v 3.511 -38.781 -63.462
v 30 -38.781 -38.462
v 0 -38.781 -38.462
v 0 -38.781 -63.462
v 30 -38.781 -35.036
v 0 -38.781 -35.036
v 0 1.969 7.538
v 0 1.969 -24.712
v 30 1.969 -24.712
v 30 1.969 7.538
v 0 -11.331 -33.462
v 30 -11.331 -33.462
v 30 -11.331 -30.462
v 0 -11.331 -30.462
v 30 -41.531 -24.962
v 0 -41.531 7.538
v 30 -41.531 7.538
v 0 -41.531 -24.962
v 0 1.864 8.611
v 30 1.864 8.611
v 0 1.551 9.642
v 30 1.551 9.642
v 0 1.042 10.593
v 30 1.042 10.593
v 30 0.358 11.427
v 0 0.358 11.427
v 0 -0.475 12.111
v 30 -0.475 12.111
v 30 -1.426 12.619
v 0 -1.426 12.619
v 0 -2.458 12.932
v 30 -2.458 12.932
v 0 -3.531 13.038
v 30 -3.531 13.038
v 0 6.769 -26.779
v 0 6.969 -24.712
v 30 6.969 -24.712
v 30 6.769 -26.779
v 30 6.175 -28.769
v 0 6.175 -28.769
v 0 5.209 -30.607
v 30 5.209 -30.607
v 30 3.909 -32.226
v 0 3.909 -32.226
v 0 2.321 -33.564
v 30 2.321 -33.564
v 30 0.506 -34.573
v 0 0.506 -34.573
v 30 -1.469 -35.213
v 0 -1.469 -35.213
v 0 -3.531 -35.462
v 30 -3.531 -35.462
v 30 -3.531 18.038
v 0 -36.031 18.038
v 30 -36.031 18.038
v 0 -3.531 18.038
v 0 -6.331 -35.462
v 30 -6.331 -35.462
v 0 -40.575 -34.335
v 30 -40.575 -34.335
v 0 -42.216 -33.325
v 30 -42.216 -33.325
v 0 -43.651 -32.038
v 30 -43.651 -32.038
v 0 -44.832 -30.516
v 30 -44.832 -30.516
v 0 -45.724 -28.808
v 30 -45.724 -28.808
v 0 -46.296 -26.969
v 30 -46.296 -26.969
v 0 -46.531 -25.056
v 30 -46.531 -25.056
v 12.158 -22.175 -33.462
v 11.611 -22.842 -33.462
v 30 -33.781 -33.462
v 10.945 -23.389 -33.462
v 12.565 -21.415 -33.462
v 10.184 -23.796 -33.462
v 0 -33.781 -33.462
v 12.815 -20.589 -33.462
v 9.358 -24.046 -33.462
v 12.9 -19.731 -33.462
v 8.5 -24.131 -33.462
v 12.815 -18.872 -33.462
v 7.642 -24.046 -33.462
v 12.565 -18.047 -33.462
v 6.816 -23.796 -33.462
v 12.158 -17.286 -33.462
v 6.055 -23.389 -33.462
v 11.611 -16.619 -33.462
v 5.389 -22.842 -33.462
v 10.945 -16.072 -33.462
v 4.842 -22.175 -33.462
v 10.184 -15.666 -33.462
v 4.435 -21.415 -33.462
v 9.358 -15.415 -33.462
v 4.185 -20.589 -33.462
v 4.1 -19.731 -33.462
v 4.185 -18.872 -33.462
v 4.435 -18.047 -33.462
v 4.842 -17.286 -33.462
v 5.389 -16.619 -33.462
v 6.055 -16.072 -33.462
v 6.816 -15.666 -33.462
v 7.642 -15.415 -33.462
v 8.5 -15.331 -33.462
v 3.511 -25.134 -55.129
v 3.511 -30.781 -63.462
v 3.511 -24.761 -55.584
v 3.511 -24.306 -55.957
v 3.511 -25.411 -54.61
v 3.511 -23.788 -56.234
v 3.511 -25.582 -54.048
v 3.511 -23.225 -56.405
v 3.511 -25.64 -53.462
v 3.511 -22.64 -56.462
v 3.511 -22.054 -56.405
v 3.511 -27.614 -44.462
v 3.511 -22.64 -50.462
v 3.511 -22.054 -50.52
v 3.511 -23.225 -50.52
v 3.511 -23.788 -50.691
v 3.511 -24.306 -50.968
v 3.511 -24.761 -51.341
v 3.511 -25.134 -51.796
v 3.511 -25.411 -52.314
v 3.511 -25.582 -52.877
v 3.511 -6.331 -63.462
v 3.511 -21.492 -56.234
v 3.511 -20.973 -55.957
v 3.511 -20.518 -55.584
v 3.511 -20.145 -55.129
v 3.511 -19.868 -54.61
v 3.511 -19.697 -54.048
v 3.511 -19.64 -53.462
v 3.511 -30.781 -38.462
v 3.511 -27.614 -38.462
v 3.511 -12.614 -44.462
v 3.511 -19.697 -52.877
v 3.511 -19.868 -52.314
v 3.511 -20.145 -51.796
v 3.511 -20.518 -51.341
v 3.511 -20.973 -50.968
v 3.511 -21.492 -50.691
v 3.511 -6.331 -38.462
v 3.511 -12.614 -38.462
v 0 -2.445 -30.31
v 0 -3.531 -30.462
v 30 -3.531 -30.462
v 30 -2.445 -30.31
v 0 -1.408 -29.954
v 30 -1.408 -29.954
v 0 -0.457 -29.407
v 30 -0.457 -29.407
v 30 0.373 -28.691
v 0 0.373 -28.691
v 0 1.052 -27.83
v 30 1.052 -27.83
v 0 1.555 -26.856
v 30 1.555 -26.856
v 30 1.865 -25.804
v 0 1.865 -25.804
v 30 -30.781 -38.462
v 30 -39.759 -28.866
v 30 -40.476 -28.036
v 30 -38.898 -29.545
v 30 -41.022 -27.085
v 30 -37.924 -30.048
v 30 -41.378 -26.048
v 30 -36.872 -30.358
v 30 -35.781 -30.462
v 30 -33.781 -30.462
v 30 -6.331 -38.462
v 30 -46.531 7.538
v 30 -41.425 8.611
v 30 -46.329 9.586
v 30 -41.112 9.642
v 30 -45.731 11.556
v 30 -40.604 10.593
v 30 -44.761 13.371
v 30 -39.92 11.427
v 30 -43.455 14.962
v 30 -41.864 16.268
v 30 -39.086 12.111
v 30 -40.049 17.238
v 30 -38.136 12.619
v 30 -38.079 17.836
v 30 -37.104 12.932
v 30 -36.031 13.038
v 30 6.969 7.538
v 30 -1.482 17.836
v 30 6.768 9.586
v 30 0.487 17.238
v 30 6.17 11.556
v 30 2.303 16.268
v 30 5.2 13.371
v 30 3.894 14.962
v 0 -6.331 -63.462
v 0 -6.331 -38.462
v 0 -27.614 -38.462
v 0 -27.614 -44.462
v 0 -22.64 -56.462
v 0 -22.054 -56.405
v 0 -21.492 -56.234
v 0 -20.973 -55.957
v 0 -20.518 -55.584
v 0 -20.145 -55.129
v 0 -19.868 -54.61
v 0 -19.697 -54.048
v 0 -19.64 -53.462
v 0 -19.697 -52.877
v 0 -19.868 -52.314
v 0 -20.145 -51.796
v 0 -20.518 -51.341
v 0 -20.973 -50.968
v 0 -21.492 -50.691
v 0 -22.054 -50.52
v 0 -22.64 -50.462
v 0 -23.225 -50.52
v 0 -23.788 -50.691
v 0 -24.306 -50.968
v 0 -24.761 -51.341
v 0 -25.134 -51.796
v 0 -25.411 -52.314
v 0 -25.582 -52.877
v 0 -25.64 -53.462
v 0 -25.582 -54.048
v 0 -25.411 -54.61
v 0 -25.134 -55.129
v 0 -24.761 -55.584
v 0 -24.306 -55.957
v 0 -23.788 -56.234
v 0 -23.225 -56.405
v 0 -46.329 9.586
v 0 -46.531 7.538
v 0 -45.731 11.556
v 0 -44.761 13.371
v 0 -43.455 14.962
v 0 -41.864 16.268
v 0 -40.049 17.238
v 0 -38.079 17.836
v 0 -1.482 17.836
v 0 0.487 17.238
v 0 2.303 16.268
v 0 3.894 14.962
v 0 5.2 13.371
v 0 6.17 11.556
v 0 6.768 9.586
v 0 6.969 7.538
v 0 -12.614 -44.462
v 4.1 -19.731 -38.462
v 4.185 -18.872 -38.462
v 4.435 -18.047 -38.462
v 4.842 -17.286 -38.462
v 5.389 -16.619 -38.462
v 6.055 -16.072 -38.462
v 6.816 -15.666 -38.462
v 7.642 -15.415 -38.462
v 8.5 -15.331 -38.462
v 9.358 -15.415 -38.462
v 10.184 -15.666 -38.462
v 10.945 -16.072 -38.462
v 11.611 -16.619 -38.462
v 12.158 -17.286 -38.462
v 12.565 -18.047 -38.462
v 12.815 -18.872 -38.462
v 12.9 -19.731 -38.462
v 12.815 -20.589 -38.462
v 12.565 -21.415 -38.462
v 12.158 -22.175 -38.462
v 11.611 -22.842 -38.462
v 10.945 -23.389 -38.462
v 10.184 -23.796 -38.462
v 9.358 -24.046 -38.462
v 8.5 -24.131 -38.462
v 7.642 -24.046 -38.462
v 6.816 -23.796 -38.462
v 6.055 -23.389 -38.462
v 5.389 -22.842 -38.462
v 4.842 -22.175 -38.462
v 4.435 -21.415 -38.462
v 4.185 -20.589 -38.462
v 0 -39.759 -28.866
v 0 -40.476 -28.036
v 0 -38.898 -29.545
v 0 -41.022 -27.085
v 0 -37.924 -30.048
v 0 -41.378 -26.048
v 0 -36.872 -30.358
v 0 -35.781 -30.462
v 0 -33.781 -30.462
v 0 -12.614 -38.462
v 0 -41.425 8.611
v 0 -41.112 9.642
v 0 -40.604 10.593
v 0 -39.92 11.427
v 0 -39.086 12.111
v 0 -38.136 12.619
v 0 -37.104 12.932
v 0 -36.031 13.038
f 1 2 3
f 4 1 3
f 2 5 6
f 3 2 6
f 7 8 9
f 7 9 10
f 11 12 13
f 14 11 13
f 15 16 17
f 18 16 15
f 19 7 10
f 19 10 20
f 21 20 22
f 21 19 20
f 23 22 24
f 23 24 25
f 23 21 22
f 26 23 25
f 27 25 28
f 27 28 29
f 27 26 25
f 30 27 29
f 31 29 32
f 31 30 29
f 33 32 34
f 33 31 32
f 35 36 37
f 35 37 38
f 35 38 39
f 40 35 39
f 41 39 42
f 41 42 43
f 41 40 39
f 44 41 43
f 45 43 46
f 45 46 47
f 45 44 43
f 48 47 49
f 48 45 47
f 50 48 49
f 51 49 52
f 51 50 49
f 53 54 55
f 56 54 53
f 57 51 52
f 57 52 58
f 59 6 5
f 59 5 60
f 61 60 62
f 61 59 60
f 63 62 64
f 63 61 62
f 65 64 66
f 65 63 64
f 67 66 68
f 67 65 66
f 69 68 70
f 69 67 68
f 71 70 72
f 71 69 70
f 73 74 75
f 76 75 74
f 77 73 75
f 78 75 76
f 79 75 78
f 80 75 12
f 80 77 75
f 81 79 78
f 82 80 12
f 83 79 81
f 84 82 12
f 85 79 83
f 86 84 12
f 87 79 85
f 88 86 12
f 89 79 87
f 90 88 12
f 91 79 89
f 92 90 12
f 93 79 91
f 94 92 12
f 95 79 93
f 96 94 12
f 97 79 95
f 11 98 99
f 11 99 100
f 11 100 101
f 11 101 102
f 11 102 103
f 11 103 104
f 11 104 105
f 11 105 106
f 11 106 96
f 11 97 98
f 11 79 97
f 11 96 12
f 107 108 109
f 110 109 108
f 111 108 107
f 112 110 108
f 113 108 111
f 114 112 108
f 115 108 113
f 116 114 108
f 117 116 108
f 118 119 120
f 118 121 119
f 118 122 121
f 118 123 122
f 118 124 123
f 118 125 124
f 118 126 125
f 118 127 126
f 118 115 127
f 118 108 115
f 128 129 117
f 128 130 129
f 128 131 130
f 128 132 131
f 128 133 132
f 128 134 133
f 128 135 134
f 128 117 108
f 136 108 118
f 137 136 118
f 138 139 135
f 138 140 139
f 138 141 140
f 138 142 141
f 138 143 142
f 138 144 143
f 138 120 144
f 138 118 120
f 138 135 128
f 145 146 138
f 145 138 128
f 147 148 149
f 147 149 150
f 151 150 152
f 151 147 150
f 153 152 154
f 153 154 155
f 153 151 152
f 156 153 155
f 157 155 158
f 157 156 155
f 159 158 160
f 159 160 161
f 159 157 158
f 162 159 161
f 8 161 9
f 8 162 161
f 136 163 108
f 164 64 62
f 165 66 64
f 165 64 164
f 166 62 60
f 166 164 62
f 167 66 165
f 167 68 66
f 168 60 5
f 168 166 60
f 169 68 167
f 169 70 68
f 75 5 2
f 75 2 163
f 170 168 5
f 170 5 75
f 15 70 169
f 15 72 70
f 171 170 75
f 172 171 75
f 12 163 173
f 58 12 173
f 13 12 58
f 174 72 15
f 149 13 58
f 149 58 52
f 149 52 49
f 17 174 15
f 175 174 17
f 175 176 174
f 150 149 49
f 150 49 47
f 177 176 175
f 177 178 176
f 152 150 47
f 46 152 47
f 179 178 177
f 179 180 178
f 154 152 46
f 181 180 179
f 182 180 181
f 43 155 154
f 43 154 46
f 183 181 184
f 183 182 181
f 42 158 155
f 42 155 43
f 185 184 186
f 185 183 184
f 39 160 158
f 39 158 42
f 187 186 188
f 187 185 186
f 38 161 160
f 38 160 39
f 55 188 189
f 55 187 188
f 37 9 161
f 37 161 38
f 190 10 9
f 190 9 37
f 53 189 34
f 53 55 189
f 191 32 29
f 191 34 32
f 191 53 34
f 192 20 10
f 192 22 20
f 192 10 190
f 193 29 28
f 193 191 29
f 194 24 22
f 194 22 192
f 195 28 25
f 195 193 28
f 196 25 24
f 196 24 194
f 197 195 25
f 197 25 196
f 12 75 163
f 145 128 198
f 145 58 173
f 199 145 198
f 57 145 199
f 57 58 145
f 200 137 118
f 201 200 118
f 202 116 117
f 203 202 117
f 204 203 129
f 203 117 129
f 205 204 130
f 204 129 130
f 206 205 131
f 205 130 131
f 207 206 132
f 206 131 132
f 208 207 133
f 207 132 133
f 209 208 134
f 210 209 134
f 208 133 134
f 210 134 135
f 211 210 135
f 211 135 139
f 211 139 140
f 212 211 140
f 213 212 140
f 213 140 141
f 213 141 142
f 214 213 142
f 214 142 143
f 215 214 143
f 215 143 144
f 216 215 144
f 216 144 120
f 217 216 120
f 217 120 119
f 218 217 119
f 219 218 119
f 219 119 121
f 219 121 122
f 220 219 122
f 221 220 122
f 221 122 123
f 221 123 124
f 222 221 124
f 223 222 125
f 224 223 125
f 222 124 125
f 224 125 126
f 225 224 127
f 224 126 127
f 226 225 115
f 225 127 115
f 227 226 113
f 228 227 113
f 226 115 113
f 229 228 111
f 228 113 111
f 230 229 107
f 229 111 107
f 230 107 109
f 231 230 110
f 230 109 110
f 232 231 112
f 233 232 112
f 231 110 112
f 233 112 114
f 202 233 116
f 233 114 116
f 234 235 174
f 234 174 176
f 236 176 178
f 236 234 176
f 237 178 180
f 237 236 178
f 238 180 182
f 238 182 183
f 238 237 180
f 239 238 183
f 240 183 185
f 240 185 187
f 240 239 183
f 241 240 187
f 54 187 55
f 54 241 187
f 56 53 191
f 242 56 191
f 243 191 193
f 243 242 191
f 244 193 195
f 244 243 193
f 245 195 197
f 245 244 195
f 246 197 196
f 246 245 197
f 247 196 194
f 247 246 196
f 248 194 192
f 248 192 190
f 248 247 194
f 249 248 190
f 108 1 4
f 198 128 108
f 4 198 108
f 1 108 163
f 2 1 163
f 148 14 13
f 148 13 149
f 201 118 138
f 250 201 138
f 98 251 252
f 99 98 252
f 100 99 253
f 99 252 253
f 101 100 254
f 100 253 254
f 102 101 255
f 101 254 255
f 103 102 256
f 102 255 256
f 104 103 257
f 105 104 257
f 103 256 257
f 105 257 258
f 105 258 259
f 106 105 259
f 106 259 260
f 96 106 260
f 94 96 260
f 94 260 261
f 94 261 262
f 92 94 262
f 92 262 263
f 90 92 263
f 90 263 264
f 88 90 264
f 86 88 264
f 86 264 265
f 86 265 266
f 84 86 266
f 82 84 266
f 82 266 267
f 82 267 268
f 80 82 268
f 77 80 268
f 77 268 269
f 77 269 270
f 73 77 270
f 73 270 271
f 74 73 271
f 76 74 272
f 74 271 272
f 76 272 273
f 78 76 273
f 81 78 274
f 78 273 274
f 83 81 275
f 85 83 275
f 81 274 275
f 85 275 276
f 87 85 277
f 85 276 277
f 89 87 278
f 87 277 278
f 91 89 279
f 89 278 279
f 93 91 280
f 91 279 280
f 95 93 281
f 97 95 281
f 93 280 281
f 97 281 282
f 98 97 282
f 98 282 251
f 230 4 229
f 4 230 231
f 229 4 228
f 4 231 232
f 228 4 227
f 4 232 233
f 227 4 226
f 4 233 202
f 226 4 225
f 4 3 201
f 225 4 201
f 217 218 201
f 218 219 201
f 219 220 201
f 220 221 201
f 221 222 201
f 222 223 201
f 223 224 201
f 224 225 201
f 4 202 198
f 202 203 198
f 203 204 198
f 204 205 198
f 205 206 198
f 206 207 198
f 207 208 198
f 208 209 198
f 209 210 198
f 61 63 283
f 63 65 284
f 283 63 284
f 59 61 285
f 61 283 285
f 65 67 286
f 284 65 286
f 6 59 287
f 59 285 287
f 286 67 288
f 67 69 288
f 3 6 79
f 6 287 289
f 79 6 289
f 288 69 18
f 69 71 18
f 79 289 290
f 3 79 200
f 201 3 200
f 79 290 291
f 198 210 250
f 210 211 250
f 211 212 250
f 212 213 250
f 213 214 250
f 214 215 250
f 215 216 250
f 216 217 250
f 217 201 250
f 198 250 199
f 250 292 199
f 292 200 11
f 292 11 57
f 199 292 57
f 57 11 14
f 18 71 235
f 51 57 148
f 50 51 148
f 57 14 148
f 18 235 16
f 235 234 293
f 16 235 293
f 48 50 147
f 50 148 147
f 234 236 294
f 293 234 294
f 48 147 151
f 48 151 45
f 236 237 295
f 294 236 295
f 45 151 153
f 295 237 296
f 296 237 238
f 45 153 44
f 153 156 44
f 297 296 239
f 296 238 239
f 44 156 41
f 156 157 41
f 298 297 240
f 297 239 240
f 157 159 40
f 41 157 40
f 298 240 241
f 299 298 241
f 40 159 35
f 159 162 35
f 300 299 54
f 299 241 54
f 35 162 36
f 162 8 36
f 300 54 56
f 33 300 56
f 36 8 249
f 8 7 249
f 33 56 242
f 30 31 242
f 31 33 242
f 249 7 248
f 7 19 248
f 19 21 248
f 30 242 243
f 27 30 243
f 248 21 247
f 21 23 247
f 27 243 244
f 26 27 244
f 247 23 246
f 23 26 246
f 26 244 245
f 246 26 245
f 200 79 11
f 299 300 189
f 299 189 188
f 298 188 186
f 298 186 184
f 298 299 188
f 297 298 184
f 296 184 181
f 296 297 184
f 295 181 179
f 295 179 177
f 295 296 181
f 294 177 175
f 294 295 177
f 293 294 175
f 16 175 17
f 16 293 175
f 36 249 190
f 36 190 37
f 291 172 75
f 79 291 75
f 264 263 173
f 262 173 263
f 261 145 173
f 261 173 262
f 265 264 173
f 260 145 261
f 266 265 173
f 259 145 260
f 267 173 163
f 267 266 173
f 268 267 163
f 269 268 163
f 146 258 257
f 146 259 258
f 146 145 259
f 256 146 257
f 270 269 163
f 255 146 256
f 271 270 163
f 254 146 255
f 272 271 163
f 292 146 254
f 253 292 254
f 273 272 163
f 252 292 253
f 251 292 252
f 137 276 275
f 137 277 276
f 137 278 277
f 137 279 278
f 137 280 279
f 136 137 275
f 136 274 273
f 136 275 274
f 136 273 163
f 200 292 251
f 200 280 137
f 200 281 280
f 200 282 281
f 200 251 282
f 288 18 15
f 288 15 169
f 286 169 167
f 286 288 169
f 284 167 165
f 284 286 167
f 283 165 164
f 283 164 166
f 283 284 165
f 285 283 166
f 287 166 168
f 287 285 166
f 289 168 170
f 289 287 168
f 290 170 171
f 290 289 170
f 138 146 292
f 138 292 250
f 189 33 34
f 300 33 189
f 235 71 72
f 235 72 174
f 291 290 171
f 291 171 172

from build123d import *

# Parameters (mm, degrees)
BOSS_EXTRUDE1_DEPTH = 30
SKETCH3_R           = 4.4
CUT_EXTRUDE1_DEPTH  = 30
SKETCH4_W           = 3.511443211
SKETCH4_H           = 32.45
BOSS_EXTRUDE2_DEPTH = 25
SKETCH5_R           = 3
CUT_EXTRUDE2_DEPTH  = 20
SKETCH6_W           = 26.488556789
SKETCH6_H           = 8
BOSS_EXTRUDE3_DEPTH = 25
CUT_EXTRUDE5_DEPTH  = 8
SKETCH9_W           = 6
SKETCH9_H           = 15
CUT_EXTRUDE6_DEPTH  = 3.511443


with BuildPart() as part:
    # Sketch1 → Boss-Extrude1 (new body)
    with BuildSketch(Plane(origin=(0, 0, 0), x_dir=(0, 0, -1), z_dir=(1, 0, 0))):
        with BuildLine():
            ThreePointArc((24.712382734, 6.969258669), (32.225912197, 3.9087055), (35.462382734, -3.530741331))
            Line((35.462382734, -3.530741331), (35.462382734, -6.330741331))
            Line((35.462382734, -6.330741331), (38.462382734, -6.330741331))
            Line((38.462382734, -6.330741331), (38.462382734, -38.780741331))
            Line((38.462382734, -38.780741331), (35.035529086, -38.780741331))
            ThreePointArc((35.035529086, -38.780741331), (31.3038679, -44.275567943), (25.056259743, -46.530741331))
            Line((25.056259743, -46.530741331), (-7.537617266, -46.530741331))
            ThreePointArc((-7.537617266, -46.530741331), (-14.962238469, -43.455362534), (-18.037617266, -36.030741331))
            Line((-18.037617266, -36.030741331), (-18.037617266, -3.530741331))
            ThreePointArc((-18.037617266, -3.530741331), (-14.962238469, 3.893879871), (-7.537617266, 6.969258669))
            Line((-7.537617266, 6.969258669), (24.712382734, 6.969258669))
        make_face()
        with BuildLine():
            Line((-13.037617266, -3.530741331), (-13.037617266, -36.030741331))
            ThreePointArc((-13.037617266, -36.030741331), (-11.426704563, -39.919828628), (-7.537617266, -41.530741331))
            Line((-7.537617266, -41.530741331), (24.962382734, -41.530741331))
            ThreePointArc((24.962382734, -41.530741331), (28.865997514, -39.759198947), (30.462382734, -35.780741331))
            Line((30.462382734, -35.780741331), (30.462382734, -33.780741331))
            Line((30.462382734, -33.780741331), (33.462382734, -33.780741331))
            Line((33.462382734, -33.780741331), (33.462382734, -11.330741331))
            Line((33.462382734, -11.330741331), (30.462382734, -11.330741331))
            Line((30.462382734, -11.330741331), (30.462382734, -3.530741331))
            ThreePointArc((30.462382734, -3.530741331), (28.69084035, 0.372873449), (24.712382734, 1.969258669))
            Line((24.712382734, 1.969258669), (-7.537617266, 1.969258669))
            ThreePointArc((-7.537617266, 1.969258669), (-11.426704563, 0.358345965), (-13.037617266, -3.530741331))
        make_face(mode=Mode.SUBTRACT)
    extrude(amount=BOSS_EXTRUDE1_DEPTH)

    # Sketch3 → Cut-Extrude1 (cut)
    with BuildSketch(Plane(origin=(0, 0, -38.462382734), x_dir=(-1, 0, 0), z_dir=(0, 0, -1))):
        with Locations((-8.5, -19.730741331)):
            Circle(SKETCH3_R)
    extrude(amount=-CUT_EXTRUDE1_DEPTH, mode=Mode.SUBTRACT)

    # Sketch4 → Boss-Extrude2 (add)
    with BuildSketch(Plane(origin=(0, 0, -38.462382734), x_dir=(-1, 0, 0), z_dir=(0, 0, -1))):
        with Locations((-1.755721606, -22.555741331)):
            Rectangle(SKETCH4_W, SKETCH4_H)
    extrude(amount=BOSS_EXTRUDE2_DEPTH)

    # Sketch5 → Cut-Extrude2 (cut)
    with BuildSketch(Plane(origin=(3.511443211, 0, 0), x_dir=(0, 0, -1), z_dir=(1, 0, 0))):
        with Locations((53.462382734, -22.639729025)):
            Circle(SKETCH5_R)
    extrude(amount=-CUT_EXTRUDE2_DEPTH, mode=Mode.SUBTRACT)

    # Sketch6 → Boss-Extrude3 (add)
    with BuildSketch(Plane(origin=(0, 0, -38.462382734), x_dir=(-1, 0, 0), z_dir=(0, 0, -1))):
        with Locations((-16.755721606, -34.780741331)):
            Rectangle(SKETCH6_W, SKETCH6_H)
    extrude(amount=BOSS_EXTRUDE3_DEPTH)

    # Sketch8 → Cut-Extrude5 (cut)
    with BuildSketch(Plane(origin=(0, -30.780741331, 0), x_dir=(1, 0, 0), z_dir=(0, 1, 0))):
        Polygon((3.511443211, 63.462382734), (30, 38.462382734), (30, 63.462382734), align=None)
    extrude(amount=-CUT_EXTRUDE5_DEPTH, mode=Mode.SUBTRACT)

    # Sketch9 → Cut-Extrude6 (cut)
    with BuildSketch(Plane(origin=(3.511443211, 0, 0), x_dir=(0, 0, -1), z_dir=(1, 0, 0))):
        with Locations((41.462382734, -20.113548678)):
            Rectangle(SKETCH9_W, SKETCH9_H)
    extrude(amount=-CUT_EXTRUDE6_DEPTH, mode=Mode.SUBTRACT)


solid = part.part
